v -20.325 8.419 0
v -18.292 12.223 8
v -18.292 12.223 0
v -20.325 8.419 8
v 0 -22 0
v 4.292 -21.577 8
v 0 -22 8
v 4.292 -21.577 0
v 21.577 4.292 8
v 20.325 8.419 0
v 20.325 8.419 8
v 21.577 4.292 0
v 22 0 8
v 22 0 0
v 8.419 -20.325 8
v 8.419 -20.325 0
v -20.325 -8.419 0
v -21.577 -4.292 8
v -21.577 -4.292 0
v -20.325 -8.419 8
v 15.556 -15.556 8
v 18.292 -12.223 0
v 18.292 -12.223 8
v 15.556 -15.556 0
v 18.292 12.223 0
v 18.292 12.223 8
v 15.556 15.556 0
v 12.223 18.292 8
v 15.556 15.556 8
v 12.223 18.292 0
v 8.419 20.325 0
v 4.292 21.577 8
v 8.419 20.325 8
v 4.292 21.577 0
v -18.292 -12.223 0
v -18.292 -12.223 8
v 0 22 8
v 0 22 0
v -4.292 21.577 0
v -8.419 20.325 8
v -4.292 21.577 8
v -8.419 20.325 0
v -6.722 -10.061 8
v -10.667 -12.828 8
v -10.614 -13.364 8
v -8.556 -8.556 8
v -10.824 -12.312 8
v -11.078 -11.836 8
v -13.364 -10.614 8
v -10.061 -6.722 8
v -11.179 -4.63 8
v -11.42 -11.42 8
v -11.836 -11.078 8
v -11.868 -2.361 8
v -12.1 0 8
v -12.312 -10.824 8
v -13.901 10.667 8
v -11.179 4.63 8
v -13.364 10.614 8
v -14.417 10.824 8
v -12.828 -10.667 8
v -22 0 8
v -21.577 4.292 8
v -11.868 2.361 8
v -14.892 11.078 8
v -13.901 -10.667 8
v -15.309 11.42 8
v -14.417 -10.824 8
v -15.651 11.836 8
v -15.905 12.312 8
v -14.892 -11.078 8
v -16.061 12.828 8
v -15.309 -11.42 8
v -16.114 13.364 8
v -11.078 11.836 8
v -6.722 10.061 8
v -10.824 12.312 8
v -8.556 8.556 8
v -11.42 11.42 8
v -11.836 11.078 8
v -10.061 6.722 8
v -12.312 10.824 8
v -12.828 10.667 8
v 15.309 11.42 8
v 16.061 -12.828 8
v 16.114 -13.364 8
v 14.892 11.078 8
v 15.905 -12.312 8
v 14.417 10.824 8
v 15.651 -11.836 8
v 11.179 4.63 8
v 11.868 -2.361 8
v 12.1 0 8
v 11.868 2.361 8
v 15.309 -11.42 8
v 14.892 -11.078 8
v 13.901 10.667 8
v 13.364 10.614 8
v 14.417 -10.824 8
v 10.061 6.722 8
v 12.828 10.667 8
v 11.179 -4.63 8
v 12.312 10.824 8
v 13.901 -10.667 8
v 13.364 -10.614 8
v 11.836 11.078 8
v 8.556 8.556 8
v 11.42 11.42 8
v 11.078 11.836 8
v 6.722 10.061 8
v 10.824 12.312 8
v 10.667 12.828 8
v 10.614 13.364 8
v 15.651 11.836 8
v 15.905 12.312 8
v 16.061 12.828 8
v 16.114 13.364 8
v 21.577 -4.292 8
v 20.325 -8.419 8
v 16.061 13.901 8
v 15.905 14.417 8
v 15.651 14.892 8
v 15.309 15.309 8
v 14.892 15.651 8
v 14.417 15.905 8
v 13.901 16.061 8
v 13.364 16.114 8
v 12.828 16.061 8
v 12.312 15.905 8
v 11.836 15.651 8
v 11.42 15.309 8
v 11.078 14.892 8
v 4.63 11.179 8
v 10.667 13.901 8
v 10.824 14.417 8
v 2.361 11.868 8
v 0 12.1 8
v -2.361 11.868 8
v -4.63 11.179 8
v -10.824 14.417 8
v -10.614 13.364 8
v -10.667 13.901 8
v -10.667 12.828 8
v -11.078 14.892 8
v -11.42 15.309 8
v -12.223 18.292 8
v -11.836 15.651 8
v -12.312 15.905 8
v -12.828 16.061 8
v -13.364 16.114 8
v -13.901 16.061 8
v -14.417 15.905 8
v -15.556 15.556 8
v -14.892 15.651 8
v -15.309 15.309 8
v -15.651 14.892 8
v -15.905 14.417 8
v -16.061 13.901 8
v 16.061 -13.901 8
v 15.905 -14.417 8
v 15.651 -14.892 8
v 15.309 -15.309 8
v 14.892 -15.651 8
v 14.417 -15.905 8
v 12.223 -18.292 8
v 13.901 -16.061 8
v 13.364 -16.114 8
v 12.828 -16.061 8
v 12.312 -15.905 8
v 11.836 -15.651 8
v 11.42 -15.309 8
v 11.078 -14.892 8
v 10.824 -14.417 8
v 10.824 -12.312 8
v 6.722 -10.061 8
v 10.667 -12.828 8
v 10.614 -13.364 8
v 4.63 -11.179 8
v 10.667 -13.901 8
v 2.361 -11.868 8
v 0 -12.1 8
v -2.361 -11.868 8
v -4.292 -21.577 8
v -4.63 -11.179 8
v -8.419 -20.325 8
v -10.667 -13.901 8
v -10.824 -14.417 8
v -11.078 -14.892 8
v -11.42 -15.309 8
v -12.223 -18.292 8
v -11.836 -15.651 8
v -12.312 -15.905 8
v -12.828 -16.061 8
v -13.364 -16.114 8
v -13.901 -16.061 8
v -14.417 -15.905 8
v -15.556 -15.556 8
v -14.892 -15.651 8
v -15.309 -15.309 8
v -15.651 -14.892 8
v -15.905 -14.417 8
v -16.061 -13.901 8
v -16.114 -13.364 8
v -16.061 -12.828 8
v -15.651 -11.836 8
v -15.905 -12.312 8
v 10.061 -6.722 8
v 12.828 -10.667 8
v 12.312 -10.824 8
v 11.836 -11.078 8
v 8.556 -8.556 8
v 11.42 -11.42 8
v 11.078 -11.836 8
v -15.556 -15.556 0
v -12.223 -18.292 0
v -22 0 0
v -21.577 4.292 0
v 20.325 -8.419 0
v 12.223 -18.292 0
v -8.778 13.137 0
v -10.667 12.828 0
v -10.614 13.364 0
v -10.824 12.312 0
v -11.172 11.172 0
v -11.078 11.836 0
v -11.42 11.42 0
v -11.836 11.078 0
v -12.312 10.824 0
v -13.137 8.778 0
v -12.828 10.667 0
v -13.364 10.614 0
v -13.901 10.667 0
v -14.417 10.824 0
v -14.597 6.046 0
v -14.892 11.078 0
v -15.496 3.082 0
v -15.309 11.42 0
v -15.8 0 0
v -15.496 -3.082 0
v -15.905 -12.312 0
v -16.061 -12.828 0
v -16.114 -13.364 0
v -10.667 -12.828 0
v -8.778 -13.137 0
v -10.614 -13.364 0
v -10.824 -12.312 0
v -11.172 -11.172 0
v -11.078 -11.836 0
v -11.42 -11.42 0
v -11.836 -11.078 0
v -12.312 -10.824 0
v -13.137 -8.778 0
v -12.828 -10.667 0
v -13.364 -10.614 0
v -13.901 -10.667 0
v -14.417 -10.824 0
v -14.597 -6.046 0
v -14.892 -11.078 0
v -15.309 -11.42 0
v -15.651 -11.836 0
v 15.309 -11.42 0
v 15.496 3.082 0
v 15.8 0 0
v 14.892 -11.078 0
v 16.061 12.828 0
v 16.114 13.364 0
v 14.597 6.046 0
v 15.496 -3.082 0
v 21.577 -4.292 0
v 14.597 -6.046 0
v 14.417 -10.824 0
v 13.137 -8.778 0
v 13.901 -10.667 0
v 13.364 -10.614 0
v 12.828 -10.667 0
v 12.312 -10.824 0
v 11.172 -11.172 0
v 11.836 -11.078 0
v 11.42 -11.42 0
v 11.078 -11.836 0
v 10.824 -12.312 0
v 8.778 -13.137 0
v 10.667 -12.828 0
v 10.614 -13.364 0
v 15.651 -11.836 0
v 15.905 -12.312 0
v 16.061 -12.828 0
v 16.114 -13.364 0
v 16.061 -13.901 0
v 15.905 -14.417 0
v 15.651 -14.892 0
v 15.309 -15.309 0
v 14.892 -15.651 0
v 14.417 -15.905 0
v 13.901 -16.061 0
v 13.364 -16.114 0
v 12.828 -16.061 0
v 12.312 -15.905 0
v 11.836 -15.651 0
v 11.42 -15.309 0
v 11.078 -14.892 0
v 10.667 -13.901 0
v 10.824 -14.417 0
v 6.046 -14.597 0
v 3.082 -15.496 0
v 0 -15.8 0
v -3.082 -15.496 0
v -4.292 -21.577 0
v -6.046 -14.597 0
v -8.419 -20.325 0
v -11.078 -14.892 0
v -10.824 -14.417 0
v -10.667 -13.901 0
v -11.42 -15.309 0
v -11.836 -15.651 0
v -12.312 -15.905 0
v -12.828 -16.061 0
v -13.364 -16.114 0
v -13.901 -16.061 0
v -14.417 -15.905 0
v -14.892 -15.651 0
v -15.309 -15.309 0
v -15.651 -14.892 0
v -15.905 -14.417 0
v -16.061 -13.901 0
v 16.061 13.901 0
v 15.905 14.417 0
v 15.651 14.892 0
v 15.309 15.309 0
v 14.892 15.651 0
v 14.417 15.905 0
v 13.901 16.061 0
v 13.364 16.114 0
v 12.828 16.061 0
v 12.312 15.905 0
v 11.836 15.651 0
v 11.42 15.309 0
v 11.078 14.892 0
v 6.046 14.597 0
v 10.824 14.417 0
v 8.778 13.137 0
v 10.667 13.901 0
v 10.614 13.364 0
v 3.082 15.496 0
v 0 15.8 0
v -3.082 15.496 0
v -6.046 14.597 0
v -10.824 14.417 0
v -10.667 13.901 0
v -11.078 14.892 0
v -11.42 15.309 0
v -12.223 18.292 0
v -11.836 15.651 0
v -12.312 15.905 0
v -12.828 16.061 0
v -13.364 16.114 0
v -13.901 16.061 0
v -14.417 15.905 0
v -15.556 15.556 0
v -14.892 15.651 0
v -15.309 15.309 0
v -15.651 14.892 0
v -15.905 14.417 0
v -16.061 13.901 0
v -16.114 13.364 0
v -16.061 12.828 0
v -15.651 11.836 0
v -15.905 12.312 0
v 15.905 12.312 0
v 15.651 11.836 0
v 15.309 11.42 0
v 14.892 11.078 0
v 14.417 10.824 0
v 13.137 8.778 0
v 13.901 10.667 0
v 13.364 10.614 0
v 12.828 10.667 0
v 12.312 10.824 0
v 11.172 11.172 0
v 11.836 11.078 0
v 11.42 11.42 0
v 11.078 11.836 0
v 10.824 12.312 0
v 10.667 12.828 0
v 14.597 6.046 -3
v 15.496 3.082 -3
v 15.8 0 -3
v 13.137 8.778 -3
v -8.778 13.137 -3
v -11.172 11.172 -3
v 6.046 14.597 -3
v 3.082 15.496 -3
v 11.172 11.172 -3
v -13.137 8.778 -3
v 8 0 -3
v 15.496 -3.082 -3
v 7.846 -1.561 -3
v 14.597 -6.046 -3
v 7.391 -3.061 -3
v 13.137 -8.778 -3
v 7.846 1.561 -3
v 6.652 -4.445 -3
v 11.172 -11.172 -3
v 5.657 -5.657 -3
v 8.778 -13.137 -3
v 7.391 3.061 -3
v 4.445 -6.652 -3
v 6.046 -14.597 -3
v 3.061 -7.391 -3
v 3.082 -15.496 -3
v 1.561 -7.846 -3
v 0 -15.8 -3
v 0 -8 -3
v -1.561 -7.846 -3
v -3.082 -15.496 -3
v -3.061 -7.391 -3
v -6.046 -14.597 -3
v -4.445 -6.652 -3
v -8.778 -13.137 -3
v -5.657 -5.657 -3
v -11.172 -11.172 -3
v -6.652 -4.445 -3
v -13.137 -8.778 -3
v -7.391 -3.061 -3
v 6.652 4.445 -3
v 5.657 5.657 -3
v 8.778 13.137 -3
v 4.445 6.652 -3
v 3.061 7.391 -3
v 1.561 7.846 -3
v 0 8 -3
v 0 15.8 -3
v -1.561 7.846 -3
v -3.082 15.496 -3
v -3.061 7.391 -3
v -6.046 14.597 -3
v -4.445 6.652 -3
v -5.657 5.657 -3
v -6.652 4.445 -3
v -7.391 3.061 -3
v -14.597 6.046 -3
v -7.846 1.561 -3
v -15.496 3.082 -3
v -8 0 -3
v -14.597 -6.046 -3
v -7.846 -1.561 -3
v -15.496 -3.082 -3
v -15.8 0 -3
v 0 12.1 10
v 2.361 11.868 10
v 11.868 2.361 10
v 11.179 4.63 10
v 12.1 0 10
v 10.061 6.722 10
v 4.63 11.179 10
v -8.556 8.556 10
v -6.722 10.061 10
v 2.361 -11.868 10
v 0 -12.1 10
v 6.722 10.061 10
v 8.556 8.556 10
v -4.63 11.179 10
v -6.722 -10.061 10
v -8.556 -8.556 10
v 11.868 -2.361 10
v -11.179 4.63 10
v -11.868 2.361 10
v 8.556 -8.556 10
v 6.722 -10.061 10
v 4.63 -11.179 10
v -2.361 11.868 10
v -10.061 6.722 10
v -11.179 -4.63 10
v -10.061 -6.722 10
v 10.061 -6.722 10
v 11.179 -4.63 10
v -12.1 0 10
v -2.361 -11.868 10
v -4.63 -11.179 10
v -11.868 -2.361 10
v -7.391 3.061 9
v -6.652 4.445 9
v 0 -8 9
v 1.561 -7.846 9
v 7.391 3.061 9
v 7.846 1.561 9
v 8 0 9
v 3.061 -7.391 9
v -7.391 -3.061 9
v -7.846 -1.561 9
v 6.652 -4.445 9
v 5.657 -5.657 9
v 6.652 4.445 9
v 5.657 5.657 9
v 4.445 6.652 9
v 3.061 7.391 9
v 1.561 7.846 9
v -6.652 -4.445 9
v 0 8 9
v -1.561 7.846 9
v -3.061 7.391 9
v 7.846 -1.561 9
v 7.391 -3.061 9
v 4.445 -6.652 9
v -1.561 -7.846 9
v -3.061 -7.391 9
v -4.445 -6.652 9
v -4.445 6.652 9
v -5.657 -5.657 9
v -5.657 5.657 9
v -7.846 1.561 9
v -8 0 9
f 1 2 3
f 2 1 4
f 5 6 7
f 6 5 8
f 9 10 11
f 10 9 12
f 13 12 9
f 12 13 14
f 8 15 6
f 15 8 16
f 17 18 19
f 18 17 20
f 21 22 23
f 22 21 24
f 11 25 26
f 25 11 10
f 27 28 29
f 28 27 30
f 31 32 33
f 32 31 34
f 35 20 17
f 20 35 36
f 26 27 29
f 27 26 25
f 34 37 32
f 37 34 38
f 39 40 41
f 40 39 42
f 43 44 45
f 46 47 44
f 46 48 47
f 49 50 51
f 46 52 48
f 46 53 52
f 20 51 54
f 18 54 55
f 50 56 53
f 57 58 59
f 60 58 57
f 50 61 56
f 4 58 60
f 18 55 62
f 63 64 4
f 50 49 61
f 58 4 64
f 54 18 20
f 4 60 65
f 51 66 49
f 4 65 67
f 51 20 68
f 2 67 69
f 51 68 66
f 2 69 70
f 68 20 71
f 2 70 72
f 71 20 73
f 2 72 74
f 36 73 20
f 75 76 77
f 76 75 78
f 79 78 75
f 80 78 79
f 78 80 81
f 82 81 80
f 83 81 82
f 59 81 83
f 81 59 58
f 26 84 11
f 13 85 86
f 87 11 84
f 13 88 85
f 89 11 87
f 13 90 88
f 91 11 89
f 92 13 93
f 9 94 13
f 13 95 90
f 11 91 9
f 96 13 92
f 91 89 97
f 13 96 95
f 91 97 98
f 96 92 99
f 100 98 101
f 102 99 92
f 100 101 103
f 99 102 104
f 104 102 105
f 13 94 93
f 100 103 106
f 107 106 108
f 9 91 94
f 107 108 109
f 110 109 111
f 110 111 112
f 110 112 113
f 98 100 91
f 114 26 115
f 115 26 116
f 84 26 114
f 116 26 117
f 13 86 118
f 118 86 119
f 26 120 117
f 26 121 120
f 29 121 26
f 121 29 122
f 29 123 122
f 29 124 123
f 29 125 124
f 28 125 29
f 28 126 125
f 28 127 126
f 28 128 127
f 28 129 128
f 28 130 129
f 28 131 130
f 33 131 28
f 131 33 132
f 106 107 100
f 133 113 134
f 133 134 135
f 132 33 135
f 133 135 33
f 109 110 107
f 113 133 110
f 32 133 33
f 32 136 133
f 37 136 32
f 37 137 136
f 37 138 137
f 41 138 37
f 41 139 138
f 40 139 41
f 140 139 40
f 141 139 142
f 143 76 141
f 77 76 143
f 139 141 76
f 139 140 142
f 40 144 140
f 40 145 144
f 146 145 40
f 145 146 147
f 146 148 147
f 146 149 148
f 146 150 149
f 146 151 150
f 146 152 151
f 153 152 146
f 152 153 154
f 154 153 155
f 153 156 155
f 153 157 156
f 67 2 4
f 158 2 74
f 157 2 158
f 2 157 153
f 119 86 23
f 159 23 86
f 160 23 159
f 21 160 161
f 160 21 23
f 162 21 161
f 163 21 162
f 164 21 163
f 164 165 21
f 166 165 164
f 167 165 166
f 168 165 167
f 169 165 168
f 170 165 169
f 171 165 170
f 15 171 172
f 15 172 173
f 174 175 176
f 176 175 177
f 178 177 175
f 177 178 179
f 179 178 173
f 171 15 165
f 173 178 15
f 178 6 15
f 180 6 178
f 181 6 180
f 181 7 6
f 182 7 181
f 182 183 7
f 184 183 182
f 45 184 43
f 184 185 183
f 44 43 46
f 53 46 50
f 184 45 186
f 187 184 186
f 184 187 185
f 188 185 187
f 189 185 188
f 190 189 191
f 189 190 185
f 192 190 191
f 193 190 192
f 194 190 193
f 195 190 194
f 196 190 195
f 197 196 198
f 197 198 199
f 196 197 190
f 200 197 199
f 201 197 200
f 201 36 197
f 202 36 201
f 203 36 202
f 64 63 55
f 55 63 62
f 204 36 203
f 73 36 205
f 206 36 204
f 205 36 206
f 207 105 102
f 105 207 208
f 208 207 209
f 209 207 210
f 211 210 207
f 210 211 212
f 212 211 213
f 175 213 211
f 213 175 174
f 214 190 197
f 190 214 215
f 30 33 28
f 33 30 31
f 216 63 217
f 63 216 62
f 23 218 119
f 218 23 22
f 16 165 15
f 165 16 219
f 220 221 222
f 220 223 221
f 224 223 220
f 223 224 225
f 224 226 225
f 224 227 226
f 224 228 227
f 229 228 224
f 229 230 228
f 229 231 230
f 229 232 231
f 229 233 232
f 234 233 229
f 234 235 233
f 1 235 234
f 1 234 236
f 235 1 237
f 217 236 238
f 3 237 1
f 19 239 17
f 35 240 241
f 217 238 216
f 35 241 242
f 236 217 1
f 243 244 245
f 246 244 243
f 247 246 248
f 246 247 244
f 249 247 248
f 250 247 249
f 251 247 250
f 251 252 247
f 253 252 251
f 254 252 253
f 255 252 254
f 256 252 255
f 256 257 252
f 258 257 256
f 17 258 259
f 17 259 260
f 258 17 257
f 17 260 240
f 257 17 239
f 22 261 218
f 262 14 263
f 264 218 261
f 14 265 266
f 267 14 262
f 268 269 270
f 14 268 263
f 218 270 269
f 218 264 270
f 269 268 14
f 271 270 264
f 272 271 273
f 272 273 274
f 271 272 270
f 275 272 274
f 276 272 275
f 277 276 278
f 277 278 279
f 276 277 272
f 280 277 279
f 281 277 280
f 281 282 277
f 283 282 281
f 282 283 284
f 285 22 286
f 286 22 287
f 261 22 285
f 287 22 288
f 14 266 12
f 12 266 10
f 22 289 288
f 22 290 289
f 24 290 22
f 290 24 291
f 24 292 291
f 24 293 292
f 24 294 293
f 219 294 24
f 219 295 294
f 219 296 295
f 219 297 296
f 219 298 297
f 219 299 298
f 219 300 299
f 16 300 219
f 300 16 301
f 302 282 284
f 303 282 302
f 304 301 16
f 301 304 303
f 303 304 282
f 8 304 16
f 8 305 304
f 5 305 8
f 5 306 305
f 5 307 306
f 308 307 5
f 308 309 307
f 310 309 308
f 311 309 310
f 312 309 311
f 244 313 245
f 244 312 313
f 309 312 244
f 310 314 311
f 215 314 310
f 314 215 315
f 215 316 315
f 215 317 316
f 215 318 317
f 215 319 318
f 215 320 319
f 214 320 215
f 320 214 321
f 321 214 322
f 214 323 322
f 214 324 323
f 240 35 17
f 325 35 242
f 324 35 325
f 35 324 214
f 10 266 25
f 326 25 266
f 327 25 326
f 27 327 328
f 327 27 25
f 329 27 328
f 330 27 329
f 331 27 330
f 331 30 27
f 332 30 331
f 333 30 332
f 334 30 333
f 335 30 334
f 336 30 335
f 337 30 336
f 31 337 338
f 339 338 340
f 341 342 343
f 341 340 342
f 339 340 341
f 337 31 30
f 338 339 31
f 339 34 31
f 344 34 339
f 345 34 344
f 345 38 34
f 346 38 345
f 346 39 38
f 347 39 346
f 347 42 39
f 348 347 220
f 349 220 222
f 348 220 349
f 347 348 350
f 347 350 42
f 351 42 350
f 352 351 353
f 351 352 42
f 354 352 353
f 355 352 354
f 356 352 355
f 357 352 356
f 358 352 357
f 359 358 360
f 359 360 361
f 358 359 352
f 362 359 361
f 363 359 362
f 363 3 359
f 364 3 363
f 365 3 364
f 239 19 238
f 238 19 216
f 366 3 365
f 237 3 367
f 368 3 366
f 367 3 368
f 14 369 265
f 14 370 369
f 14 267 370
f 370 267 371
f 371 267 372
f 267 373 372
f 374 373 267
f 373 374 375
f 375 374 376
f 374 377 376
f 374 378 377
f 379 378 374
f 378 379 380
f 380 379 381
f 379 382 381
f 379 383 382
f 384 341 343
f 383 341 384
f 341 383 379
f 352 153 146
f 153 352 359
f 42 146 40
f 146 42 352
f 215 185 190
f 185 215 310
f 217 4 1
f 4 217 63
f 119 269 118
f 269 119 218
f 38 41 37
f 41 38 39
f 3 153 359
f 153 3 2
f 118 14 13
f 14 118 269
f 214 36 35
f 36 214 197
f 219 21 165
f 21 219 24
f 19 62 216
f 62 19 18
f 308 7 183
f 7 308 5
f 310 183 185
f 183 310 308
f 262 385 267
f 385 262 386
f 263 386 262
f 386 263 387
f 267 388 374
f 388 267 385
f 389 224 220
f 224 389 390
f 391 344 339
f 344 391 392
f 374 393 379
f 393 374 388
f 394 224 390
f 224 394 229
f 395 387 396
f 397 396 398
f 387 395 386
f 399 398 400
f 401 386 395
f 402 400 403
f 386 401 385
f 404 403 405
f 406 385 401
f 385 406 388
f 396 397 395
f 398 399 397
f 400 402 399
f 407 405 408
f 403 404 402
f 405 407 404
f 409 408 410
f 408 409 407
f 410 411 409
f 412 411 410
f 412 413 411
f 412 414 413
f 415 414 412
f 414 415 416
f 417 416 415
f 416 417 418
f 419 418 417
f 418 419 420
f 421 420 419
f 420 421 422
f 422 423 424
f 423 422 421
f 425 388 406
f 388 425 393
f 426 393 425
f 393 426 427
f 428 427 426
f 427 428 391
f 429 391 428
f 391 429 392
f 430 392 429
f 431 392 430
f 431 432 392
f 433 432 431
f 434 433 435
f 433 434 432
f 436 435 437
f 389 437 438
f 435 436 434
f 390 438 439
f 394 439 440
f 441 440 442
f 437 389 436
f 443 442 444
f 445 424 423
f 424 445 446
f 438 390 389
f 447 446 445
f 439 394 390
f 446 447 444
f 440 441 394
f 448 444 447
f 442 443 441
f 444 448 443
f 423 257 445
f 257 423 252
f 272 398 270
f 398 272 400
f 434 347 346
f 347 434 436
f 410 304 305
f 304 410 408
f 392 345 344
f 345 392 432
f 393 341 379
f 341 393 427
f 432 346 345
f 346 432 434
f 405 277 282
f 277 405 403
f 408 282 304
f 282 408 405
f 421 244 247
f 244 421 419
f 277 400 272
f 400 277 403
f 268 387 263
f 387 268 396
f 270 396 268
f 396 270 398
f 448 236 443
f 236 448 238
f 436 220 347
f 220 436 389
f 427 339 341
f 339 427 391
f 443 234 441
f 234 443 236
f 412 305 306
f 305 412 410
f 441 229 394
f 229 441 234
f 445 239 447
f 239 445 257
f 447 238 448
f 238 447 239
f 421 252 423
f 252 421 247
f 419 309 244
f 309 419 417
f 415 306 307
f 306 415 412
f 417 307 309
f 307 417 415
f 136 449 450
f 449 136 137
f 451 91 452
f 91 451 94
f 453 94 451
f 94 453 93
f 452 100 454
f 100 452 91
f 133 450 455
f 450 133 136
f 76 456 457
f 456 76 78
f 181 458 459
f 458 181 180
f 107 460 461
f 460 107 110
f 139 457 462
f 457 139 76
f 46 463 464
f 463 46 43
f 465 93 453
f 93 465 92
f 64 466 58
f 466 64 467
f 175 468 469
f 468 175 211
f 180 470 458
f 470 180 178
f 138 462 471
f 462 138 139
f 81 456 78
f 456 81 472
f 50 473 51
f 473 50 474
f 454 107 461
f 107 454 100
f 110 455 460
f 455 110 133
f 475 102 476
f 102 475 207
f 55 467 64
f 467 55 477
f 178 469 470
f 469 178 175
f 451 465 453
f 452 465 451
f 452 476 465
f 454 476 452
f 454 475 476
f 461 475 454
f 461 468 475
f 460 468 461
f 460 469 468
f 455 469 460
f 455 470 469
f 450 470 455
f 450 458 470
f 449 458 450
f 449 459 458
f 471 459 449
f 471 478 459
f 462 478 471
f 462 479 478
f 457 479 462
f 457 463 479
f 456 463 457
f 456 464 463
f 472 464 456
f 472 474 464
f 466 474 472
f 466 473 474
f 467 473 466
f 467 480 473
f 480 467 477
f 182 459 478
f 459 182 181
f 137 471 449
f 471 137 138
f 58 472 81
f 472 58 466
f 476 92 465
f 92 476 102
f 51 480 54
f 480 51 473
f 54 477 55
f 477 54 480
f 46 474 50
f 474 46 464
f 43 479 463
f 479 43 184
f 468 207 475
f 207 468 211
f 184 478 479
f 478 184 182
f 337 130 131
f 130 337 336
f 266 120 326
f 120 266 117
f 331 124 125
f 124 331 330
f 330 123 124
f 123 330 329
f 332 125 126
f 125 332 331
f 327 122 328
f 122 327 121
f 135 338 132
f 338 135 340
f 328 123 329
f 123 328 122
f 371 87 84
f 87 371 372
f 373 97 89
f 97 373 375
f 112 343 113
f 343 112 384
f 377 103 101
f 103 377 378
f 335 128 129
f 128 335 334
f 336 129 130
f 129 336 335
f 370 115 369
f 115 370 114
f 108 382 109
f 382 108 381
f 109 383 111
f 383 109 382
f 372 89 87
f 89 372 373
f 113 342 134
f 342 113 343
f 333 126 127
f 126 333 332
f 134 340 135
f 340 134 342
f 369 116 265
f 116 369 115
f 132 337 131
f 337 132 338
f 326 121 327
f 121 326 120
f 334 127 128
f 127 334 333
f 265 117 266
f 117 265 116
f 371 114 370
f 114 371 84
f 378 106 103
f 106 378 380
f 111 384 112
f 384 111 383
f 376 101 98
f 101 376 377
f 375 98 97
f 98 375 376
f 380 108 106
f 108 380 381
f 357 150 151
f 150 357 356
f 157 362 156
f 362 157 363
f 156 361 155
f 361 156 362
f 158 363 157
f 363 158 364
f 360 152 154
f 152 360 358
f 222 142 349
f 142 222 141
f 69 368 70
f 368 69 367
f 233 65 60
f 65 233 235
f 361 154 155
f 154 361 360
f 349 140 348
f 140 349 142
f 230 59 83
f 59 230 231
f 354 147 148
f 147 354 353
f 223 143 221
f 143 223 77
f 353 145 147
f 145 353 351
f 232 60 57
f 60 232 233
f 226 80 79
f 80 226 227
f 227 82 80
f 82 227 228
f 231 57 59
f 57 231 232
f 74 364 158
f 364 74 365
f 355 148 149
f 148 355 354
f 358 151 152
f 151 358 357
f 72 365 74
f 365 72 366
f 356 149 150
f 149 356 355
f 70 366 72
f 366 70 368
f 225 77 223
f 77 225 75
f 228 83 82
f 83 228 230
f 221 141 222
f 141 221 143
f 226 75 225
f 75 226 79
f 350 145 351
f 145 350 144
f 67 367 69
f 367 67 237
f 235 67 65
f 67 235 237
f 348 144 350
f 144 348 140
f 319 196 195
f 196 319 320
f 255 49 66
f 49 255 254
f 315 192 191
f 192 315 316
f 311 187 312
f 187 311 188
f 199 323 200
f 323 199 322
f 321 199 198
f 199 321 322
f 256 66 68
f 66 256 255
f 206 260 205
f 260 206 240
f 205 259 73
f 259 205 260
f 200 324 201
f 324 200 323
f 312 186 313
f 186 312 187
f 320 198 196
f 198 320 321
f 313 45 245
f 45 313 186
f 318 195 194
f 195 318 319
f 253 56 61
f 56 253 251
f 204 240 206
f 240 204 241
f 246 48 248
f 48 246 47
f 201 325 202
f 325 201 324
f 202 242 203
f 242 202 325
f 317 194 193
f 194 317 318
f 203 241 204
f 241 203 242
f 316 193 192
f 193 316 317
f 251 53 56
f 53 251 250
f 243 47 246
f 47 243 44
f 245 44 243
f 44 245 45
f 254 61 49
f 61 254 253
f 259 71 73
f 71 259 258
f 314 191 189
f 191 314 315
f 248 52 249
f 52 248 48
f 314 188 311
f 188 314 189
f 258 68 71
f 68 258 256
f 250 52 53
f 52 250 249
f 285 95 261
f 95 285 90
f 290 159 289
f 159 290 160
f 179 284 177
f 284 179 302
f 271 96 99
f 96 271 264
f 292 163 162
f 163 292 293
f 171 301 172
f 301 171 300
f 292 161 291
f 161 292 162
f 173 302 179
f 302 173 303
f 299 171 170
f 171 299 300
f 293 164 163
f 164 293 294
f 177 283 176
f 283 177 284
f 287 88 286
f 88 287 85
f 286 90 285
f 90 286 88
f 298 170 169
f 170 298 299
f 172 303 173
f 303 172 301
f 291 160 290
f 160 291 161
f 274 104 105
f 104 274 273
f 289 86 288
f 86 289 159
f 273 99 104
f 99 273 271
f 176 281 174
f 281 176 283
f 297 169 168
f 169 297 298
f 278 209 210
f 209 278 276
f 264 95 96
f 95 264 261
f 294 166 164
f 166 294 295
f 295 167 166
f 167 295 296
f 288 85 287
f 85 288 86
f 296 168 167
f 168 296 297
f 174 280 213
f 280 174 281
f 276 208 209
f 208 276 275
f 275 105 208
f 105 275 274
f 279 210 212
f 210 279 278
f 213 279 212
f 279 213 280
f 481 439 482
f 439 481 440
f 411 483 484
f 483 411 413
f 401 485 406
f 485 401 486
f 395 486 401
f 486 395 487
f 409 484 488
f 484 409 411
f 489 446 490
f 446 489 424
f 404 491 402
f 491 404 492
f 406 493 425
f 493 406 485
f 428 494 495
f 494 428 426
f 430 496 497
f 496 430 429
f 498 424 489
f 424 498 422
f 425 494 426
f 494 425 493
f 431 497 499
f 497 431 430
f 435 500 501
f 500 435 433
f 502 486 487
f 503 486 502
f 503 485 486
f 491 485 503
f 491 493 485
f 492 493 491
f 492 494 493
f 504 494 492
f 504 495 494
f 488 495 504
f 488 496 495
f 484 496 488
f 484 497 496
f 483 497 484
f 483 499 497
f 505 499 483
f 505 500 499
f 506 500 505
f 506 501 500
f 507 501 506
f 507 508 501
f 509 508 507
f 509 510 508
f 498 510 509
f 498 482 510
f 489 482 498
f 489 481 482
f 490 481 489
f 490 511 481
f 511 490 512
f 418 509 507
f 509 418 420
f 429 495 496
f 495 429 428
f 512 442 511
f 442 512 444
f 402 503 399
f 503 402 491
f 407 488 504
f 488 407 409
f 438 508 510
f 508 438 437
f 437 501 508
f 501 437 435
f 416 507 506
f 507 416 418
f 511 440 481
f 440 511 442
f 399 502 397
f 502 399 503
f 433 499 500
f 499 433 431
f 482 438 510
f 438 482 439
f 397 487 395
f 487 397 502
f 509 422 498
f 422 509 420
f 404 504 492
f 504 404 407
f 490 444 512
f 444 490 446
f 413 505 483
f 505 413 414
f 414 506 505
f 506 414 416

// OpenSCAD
$fn = 32;

// ----------------------------------------------------------------------
// Retaining cap: 6002 cover, 44 mm, spigot 31.6 mm
// ----------------------------------------------------------------------

// --- parameters (mm) ---
cap_d = 44;               // cover diameter
cap_t = 8;                // cover thickness
lip_d = 31.6;             // spigot that enters the housing
lip_h = 3;                // spigot height
shaft_d = 16;             // shaft opening
bolt_d = 5.5;             // bolt clearance
bolt_r = 18.9;            // bolt circle radius
dome_h = 2;               // raised centre

module cover() {
  cylinder(h = cap_t, d = cap_d);
}

module spigot() {
  /* sunk 1 mm into the cover; the spigot sets the overall height */
  translate([0, 0, -lip_h]) cylinder(h = lip_h + 1, d = lip_d);
}

module dome() {
  translate([0, 0, cap_t - 1]) cylinder(h = dome_h + 1, d = cap_d * 0.55);
}

difference() {
  union() {
    cover();
    spigot();
    dome();
  }
  for (i = [0 : 3]) rotate([0, 0, 45 + i * 90]) translate([bolt_r, 0, -lip_h - 1])
    cylinder(h = lip_h + cap_t + 2, d = bolt_d);
  translate([0, 0, -lip_h - 1]) cylinder(h = lip_h + cap_t + 2, d = shaft_d);
}
